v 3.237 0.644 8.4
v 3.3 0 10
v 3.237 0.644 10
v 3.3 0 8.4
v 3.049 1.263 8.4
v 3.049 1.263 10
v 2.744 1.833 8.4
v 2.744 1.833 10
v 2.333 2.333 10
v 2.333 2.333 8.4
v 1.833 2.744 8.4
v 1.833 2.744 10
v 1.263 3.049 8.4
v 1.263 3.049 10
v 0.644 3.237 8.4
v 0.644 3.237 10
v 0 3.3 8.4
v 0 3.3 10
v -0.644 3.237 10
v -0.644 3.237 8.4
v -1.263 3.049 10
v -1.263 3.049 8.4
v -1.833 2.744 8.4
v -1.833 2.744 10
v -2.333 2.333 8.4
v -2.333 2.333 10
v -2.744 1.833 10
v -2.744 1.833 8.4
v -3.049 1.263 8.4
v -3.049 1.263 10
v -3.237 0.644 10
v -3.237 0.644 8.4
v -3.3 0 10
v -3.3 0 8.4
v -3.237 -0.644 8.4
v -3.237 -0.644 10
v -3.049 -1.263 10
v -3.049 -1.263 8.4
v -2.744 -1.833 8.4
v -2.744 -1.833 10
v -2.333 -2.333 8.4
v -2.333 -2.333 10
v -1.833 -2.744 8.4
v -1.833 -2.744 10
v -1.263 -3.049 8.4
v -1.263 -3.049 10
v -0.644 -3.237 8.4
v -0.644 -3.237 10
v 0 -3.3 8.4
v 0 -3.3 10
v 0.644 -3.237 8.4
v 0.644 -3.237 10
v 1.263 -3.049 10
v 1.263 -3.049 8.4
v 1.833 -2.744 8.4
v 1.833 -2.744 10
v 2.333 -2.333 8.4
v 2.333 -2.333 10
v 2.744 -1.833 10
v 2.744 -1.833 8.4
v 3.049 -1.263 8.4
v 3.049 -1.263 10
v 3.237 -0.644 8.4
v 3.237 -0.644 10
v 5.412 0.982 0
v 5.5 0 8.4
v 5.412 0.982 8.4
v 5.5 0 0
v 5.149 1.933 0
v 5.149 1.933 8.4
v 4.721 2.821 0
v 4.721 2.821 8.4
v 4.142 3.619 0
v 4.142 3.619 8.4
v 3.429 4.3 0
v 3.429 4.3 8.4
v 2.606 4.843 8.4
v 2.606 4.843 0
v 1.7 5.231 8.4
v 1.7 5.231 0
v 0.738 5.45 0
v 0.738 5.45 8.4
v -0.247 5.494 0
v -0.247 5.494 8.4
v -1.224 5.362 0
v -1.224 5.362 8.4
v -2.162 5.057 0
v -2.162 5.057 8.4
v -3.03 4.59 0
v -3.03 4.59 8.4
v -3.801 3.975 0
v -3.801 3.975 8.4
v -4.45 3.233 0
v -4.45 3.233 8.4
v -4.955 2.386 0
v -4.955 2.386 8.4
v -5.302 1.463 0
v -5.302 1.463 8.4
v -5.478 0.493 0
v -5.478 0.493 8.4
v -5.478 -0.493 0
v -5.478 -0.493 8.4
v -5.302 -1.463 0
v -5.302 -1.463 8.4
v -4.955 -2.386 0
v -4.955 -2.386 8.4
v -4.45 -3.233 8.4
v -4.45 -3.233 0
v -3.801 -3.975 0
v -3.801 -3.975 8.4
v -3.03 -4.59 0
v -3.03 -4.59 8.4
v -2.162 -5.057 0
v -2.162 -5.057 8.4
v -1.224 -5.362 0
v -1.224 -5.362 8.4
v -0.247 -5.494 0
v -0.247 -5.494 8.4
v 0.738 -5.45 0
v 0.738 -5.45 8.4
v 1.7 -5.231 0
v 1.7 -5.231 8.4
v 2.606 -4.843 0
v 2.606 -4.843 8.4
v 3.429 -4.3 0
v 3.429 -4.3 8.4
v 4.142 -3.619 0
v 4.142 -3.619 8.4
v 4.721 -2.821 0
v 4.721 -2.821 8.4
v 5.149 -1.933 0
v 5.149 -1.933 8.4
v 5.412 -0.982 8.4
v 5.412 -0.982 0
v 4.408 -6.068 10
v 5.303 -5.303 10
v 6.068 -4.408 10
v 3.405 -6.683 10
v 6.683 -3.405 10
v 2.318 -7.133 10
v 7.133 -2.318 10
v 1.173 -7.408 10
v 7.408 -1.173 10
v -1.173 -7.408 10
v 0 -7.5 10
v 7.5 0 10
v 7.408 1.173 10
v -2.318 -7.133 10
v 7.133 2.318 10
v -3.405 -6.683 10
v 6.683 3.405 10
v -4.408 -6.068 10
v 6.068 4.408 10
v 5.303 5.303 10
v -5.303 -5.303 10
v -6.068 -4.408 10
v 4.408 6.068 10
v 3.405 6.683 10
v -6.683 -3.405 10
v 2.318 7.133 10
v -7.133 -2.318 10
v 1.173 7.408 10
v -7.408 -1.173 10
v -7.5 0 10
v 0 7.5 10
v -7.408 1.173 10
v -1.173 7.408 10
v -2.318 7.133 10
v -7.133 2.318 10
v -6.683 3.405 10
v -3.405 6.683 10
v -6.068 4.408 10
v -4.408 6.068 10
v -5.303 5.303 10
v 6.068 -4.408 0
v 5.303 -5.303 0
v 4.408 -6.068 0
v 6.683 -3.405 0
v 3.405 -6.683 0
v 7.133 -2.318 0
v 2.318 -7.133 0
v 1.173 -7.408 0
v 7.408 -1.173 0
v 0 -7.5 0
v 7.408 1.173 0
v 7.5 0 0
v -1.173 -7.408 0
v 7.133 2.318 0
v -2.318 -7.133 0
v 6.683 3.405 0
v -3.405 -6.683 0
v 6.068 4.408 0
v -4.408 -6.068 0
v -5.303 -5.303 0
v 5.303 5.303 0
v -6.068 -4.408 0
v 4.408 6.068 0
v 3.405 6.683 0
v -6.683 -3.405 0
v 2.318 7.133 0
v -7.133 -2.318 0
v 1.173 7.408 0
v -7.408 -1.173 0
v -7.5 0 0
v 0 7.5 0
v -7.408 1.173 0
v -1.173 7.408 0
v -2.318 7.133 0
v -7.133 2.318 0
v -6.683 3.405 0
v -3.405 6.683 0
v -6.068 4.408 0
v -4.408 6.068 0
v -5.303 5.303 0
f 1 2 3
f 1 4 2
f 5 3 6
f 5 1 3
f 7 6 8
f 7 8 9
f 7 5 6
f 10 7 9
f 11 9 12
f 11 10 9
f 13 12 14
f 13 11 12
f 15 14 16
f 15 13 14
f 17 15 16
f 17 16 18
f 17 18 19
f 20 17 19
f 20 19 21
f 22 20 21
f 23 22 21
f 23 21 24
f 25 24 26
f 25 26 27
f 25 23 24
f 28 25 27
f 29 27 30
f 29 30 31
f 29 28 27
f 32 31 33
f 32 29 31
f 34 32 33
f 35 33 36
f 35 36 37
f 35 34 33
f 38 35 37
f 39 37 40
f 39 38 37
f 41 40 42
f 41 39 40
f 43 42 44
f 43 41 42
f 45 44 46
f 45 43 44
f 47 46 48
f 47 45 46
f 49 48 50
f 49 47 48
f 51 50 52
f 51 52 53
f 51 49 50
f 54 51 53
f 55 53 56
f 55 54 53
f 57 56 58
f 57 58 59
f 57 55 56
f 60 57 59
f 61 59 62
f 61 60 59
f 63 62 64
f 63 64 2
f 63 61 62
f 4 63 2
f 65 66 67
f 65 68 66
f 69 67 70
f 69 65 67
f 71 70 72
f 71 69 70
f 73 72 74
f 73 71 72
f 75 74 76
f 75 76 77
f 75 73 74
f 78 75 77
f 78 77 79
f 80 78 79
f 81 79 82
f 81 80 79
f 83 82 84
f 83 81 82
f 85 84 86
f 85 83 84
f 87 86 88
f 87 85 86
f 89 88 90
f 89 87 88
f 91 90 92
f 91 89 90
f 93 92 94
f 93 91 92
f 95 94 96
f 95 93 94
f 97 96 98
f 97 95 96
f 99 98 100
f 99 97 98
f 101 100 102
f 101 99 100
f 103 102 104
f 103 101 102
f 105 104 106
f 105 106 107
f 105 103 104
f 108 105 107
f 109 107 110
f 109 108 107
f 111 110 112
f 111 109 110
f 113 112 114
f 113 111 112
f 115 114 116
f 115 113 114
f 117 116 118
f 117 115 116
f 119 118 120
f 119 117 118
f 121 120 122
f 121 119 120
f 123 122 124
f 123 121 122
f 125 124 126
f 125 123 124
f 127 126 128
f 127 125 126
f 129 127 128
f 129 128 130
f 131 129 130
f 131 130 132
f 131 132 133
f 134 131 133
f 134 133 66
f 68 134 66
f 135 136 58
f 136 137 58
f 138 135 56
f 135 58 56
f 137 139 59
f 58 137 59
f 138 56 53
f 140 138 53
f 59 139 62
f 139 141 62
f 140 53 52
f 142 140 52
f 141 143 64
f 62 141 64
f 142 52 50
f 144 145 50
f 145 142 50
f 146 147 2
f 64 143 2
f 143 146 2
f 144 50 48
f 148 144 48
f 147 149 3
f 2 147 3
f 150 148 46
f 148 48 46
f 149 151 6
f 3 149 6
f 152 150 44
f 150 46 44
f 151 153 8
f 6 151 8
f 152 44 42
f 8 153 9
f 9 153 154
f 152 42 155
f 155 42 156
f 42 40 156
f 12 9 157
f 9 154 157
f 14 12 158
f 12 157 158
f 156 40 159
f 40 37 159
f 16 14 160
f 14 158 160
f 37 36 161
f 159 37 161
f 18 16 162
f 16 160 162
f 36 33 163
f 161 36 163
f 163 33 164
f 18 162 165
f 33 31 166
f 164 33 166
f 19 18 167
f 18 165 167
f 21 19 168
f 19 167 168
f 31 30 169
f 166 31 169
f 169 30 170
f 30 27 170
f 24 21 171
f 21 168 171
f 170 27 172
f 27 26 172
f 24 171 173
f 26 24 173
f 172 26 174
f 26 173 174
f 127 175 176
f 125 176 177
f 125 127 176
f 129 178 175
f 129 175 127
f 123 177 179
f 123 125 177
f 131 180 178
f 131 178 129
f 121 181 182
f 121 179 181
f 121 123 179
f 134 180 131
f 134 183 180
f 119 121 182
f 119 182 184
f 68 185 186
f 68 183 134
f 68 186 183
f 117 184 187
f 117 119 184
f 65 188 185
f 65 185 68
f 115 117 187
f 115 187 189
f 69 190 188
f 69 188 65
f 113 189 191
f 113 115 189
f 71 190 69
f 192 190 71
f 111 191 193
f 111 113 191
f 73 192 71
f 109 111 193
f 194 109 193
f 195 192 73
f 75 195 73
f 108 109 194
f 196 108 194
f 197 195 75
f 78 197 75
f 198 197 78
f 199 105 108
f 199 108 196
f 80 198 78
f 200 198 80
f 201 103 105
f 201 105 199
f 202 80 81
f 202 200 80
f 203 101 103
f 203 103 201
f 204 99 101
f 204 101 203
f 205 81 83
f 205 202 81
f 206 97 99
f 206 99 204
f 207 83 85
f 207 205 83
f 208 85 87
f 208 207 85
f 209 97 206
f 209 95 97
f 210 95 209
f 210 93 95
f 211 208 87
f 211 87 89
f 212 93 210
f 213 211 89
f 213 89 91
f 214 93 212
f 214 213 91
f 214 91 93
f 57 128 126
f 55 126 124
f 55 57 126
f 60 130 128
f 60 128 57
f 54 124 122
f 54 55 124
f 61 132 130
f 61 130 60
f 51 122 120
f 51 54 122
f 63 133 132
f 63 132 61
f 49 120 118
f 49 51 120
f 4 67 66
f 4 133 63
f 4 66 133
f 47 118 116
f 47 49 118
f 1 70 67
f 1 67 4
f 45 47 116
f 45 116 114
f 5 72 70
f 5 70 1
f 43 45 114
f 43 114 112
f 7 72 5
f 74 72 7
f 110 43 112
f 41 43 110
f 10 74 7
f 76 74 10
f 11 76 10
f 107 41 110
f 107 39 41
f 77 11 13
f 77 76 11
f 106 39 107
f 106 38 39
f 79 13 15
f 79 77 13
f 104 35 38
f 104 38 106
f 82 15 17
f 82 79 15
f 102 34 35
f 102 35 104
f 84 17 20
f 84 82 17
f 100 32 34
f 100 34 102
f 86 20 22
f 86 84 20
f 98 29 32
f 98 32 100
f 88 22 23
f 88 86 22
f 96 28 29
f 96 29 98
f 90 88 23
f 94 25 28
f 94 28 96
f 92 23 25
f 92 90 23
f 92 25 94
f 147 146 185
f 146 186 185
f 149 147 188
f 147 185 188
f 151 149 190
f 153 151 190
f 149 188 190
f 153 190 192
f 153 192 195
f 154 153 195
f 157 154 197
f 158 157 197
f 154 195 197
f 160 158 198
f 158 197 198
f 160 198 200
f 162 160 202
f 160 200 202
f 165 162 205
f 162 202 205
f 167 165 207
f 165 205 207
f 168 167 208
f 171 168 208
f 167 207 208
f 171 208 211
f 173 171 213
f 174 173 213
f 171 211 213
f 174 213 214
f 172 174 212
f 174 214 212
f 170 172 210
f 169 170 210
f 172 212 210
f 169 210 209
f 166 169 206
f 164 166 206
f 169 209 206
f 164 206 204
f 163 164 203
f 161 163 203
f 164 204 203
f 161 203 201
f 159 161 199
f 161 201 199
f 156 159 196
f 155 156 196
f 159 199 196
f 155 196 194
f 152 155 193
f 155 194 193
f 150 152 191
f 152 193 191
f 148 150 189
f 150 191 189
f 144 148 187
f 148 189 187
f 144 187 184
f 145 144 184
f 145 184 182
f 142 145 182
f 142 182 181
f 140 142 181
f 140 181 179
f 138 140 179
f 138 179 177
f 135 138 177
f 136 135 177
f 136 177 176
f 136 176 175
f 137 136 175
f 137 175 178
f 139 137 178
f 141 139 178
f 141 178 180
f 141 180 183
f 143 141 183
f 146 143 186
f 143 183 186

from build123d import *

# Parameters (mm, degrees)
SZKIC1_W                    = 10
SZKIC1_H                    = 7.5
SZKIC3_R                    = 5.625
DODANIE_WYCI_GNI_CIE1_DEPTH = 3.75


with BuildPart() as part:
    # Szkic1 → Obrót1 (revolve)
    with BuildSketch(Plane(origin=(0, 0, 0), x_dir=(0, 0, -1), z_dir=(1, 0, 0)), mode=Mode.PRIVATE) as obr_t1_sk:
        with Locations((-5, 3.75)):
            Rectangle(SZKIC1_W, SZKIC1_H)
    revolve(obr_t1_sk.sketch.rotate(Axis((0, 0, 0), (0, 0, 1)), 270), axis=Axis((0, 0, 0), (0, 0, 1)))

    # Szkic2 → Wycięcie-obrót1 (revolve, cut)
    with BuildSketch(Plane(origin=(0, 0, 0), x_dir=(0, 0, -1), z_dir=(1, 0, 0)), mode=Mode.PRIVATE) as wyci_cie_obr_t1_sk:
        Polygon((-10, 0), (-10, 3.3), (-8.4, 3.3), (-8.4, 5.5), (0, 5.5), (0, 0), align=None)
    revolve(wyci_cie_obr_t1_sk.sketch.rotate(Axis((0, 0, 0), (0, 0, 1)), 270), axis=Axis((0, 0, 0), (0, 0, 1)), mode=Mode.SUBTRACT)


with BuildPart() as body_2:
    # Szkic3 → Dodanie-wyciągnięcie1 (new body)
    with BuildSketch(Plane(origin=(0, 0, 0), x_dir=(0, 0, -1), z_dir=(1, 0, 0))):
        Circle(SZKIC3_R)
    extrude(amount=DODANIE_WYCI_GNI_CIE1_DEPTH)

    # Usuń ścianę1: 1 face struck out; the rest of the skin is kept as a surface, the solid goes
    usu_cian_1_1_drop = [body_2.part.faces().sort_by_distance(Vector(p))[0] for p in ((3.75, 0, 0),)]
    usu_cian_1_1 = Shell(body_2.part.faces() - usu_cian_1_1_drop)


solid = part.part
